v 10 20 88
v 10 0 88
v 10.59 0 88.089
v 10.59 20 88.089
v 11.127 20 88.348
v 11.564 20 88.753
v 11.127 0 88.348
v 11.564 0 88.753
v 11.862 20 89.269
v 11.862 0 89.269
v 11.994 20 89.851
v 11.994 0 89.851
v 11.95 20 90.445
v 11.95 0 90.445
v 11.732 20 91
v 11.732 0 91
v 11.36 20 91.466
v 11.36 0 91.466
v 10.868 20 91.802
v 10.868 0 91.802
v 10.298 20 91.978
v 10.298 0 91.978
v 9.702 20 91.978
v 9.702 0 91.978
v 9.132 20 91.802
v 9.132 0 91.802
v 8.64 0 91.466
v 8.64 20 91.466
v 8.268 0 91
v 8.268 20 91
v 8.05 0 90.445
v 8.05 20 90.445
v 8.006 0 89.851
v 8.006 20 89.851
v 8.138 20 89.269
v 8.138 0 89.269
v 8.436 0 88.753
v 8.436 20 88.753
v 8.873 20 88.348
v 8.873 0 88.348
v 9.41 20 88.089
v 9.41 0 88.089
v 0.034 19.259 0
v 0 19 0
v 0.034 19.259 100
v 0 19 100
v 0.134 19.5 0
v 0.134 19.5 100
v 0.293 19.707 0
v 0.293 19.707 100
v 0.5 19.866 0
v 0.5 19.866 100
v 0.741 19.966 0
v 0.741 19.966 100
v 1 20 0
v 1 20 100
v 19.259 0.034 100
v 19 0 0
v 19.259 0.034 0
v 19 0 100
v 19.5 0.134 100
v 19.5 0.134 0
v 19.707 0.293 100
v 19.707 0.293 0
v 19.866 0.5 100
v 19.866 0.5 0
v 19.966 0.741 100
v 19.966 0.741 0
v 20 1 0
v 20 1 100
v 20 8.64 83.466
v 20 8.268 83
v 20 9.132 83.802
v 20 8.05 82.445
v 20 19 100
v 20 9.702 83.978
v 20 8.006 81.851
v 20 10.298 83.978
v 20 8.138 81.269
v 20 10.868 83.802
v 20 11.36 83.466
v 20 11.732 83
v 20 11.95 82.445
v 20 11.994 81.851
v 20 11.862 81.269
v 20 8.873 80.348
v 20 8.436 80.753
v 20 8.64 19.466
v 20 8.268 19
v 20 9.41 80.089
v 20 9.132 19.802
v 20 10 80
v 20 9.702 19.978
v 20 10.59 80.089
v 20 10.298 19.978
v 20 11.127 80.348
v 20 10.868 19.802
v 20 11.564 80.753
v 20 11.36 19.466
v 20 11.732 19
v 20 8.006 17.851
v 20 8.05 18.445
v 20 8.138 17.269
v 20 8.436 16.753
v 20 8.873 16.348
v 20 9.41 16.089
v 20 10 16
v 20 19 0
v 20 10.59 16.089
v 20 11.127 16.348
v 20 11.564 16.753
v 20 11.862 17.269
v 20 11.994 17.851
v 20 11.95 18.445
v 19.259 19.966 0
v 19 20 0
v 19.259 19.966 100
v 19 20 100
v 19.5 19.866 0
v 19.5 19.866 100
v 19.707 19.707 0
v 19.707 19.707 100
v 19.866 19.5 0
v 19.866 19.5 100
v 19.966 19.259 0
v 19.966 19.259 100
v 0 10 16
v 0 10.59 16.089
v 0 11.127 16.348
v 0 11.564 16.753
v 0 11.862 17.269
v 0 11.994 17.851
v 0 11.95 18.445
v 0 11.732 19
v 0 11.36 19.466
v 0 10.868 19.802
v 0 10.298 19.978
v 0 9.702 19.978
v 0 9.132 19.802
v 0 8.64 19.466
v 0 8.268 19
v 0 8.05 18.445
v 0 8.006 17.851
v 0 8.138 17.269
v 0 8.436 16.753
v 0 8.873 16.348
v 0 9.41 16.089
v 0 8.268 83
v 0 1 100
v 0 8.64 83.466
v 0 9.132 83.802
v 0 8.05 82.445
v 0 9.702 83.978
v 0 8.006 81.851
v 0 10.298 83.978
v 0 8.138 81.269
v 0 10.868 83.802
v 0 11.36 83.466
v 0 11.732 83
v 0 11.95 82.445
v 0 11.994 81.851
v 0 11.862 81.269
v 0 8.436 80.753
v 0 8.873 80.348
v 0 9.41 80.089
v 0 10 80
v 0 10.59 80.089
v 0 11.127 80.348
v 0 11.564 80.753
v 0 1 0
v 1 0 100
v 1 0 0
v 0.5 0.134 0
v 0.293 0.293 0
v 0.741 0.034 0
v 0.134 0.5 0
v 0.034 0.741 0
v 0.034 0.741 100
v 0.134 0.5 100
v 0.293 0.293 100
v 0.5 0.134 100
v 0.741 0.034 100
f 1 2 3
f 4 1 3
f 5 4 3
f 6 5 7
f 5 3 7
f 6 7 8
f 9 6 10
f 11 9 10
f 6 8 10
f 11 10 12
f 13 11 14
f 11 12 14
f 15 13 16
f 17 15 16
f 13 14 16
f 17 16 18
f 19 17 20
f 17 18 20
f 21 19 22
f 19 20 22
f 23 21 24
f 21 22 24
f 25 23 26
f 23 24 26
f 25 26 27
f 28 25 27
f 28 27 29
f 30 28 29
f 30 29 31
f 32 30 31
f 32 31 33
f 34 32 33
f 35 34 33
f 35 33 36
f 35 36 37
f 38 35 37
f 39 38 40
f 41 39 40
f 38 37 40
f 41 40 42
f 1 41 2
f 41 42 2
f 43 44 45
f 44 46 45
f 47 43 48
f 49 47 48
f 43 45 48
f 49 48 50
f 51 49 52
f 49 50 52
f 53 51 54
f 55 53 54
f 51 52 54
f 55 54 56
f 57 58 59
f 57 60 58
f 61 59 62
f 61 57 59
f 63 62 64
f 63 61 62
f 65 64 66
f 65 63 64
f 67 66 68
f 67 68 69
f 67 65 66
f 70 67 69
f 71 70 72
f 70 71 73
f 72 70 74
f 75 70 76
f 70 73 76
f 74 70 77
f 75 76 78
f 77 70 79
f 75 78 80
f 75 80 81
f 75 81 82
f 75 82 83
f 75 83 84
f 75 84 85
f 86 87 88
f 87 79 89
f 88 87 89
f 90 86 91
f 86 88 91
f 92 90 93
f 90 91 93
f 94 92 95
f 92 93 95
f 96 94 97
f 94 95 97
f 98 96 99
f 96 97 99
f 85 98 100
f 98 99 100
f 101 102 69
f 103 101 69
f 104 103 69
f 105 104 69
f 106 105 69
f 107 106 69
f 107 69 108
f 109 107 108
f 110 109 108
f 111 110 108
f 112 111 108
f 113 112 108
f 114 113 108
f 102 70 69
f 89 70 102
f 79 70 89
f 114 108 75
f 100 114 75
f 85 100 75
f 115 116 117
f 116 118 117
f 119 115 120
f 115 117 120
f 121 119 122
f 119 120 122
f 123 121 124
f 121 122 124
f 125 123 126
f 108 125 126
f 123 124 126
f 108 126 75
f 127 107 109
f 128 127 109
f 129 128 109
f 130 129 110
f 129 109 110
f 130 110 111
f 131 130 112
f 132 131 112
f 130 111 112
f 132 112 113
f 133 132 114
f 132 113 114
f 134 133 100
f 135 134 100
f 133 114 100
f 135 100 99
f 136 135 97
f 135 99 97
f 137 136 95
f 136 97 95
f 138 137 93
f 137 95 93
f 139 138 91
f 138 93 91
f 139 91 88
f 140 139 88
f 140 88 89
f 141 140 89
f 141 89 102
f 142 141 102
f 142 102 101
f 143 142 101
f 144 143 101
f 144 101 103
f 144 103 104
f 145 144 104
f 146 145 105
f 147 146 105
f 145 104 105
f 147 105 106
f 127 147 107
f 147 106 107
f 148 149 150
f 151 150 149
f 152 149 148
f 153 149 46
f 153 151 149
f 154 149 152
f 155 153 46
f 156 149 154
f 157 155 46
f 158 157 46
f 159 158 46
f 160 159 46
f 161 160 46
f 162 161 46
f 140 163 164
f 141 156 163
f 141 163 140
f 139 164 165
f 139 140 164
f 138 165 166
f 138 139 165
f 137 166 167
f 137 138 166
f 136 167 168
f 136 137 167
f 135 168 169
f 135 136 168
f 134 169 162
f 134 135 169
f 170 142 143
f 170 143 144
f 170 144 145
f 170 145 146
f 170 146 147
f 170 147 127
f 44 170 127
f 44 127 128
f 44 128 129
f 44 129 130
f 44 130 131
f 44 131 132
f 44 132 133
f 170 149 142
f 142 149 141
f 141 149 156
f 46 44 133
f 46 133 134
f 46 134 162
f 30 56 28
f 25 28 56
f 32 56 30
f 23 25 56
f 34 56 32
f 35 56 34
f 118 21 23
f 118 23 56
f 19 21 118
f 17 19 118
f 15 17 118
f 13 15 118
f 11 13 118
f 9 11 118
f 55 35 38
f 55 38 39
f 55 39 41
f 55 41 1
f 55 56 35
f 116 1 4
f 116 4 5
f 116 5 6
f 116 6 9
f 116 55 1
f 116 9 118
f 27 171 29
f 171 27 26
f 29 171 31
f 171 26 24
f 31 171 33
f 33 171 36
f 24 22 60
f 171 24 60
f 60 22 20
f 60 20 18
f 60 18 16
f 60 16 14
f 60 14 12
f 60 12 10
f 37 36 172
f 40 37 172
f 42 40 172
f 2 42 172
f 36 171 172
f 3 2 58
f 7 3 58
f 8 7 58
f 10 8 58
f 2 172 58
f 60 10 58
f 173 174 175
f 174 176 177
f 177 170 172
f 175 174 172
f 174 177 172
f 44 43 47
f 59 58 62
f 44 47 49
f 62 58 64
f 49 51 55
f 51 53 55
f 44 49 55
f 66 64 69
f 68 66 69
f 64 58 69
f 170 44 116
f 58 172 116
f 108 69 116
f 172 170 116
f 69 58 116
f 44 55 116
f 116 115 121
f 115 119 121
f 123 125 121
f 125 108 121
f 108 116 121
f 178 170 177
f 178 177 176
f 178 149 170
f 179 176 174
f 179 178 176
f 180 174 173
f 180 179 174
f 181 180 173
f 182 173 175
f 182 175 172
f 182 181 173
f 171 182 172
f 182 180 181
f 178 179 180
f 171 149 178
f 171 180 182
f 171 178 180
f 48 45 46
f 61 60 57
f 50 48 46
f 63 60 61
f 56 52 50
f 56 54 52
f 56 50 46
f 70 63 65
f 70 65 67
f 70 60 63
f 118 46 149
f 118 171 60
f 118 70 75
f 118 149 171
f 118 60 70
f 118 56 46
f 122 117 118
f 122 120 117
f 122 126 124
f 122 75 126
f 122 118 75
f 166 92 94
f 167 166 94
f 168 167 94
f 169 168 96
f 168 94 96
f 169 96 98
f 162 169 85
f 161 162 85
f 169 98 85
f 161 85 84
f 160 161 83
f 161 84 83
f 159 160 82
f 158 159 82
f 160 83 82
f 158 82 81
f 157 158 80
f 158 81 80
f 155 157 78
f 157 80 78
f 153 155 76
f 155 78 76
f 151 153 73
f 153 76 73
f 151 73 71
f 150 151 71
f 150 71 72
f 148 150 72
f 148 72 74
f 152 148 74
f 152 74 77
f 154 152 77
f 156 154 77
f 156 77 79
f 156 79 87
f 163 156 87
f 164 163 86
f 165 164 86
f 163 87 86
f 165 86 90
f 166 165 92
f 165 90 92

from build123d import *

# Parameters (mm, degrees)
SKETCH_1_W          = 20
SKETCH_1_H          = 20
EXTRUDE_1_DEPTH     = 100
SKETCH_2_R          = 2
CUT_EXTRUDE_1_DEPTH = 20
SKETCH_3_R          = 2
CUT_EXTRUDE_2_DEPTH = 20
FILLET_1_R          = 1


with BuildPart() as part:
    # 草图1 → 凸台-拉伸1 (new body)
    with BuildSketch(Plane.XY):
        with Locations((10, 10)):
            Rectangle(SKETCH_1_W, SKETCH_1_H)
    extrude(amount=EXTRUDE_1_DEPTH)

    # 草图2 → 切除-拉伸1 (cut)
    with BuildSketch(Plane(origin=(20, 0, 0), x_dir=(0, 0, -1), z_dir=(1, 0, 0))):
        with Locations((-18, 10)):
            Circle(SKETCH_2_R)
        with Locations((-82, 10)):
            Circle(SKETCH_2_R)
    extrude(amount=-CUT_EXTRUDE_1_DEPTH, mode=Mode.SUBTRACT)

    # 草图3 → 切除-拉伸2 (cut)
    with BuildSketch(Plane.XZ):
        with Locations(Location((10, 90, 0), (0, 0, 270))):
            Circle(SKETCH_3_R)
    extrude(amount=-CUT_EXTRUDE_2_DEPTH, mode=Mode.SUBTRACT)

    # 圆角1
    fillet_1_edges = [part.edges().sort_by_distance(p)[0] for p in [
        (0, 20, 50),
        (20, 20, 50),
        (20, 0, 50),
        (0, 0, 50),
    ]]
    fillet(fillet_1_edges, radius=FILLET_1_R)


solid = part.part
